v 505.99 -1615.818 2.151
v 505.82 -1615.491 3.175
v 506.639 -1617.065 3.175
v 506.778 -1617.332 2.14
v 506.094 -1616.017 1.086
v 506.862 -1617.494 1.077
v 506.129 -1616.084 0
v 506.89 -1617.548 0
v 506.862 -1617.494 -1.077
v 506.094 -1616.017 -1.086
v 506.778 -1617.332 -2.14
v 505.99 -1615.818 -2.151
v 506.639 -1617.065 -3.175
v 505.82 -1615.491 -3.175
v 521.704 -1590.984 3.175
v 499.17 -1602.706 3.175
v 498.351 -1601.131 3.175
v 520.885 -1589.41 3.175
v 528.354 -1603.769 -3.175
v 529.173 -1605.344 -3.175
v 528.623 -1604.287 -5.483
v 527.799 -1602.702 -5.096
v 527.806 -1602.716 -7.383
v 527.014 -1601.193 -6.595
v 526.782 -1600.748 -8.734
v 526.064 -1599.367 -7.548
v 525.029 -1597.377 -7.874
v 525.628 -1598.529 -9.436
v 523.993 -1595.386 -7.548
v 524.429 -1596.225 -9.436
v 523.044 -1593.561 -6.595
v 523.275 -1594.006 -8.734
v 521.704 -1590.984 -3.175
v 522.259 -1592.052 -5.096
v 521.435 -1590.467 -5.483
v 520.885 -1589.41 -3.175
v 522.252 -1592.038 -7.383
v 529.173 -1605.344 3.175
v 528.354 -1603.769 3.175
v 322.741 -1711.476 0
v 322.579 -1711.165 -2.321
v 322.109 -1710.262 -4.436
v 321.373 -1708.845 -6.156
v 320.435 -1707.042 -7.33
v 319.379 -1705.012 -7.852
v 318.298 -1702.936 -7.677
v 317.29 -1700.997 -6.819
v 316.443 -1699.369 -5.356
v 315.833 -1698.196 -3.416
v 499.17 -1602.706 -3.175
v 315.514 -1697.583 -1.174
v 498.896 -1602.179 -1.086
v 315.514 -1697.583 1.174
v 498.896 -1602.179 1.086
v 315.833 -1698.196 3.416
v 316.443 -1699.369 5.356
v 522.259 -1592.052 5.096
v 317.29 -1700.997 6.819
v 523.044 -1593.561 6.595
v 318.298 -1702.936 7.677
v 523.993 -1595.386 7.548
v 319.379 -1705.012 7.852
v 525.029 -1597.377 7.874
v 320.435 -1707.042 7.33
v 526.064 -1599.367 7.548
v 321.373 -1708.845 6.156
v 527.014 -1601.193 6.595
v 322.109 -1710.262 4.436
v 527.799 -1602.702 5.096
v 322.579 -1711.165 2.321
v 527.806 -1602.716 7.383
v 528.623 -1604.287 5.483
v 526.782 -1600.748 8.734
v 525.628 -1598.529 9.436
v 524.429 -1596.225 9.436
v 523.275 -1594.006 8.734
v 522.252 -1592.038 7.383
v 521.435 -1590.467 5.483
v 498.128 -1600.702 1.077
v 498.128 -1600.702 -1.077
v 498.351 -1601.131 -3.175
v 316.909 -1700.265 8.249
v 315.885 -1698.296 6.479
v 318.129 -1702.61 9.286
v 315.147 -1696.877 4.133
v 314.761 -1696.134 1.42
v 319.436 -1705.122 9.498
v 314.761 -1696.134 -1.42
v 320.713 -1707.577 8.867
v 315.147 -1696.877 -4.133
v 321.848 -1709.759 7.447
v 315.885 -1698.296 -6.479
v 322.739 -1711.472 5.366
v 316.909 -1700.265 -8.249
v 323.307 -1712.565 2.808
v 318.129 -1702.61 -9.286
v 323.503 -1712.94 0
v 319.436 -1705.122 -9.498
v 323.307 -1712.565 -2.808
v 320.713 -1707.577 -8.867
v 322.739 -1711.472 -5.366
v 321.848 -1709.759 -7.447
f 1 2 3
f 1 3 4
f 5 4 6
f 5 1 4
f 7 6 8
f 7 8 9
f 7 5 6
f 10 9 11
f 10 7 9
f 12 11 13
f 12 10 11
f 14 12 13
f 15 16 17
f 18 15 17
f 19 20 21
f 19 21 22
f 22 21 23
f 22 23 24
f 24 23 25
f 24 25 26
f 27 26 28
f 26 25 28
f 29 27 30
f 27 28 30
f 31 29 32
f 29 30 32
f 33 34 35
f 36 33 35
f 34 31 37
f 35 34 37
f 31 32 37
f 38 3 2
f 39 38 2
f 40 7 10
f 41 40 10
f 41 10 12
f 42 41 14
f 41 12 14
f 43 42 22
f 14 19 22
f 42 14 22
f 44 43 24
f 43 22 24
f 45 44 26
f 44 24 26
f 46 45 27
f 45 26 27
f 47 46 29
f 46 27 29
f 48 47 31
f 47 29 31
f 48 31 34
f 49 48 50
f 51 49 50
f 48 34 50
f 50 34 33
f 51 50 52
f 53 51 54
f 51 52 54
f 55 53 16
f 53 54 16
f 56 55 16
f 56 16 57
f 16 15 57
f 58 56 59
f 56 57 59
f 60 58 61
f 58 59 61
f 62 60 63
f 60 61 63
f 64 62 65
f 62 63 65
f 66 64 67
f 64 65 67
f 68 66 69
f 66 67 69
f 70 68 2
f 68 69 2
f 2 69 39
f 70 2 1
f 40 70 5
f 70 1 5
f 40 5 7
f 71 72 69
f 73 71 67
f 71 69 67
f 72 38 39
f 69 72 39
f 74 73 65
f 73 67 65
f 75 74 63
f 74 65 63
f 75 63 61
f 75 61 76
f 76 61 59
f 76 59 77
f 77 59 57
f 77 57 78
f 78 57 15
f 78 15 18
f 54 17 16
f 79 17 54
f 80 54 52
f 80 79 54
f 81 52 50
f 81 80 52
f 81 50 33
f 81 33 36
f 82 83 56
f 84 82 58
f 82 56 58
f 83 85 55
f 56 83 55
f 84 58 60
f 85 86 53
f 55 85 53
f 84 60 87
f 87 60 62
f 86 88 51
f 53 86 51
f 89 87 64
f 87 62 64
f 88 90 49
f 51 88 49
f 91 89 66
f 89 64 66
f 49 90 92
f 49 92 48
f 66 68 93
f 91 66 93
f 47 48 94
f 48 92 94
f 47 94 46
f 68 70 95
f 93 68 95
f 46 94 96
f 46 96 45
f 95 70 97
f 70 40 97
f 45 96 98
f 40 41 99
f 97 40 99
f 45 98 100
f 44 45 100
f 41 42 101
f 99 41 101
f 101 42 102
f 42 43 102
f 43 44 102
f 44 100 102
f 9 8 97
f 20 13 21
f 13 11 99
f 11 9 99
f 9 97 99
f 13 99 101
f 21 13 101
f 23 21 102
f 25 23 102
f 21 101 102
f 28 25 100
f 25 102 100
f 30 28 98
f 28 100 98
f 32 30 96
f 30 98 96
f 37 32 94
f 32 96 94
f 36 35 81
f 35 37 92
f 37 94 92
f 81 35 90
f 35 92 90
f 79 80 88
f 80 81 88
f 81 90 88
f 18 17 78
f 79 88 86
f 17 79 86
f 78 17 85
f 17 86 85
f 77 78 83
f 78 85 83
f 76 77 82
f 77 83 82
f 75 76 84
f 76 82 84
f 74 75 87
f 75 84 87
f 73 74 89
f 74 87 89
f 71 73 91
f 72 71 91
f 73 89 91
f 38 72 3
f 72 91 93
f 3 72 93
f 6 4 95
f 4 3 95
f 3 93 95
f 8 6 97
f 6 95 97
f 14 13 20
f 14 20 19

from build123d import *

# Parameters (mm, degrees)
CUT_EXTRUDE1_START = -25.4
SKETCH2_W          = 6.35
SKETCH2_H          = 19.05
CUT_EXTRUDE1_DEPTH = 25.4


with BuildPart() as part:
    # Sketch1 → Revolve1 (revolve)
    with BuildSketch(Plane.XY):
        Polygon((528.662376284, -1604.36232837), (529.424259242, -1605.827024707), (323.502507791, -1712.940198389), (322.740624833, -1711.475502052), align=None)
    revolve(axis=Axis((319.107029188, -1704.490027216, 0), (0.887157078, 0.46146757, 0)))

    # Sketch2 → Cut-Extrude1 (cut)
    with BuildSketch(Plane(origin=(-240.734168067, -125.221355071, 0), x_dir=(0, 0, -1), z_dir=(0.887157078, 0.46146757, 0)).offset(CUT_EXTRUDE1_START)):
        with Locations((0, -1659.407938171)):
            Rectangle(SKETCH2_W, SKETCH2_H)
    extrude(amount=CUT_EXTRUDE1_DEPTH, mode=Mode.SUBTRACT)


solid = part.part
